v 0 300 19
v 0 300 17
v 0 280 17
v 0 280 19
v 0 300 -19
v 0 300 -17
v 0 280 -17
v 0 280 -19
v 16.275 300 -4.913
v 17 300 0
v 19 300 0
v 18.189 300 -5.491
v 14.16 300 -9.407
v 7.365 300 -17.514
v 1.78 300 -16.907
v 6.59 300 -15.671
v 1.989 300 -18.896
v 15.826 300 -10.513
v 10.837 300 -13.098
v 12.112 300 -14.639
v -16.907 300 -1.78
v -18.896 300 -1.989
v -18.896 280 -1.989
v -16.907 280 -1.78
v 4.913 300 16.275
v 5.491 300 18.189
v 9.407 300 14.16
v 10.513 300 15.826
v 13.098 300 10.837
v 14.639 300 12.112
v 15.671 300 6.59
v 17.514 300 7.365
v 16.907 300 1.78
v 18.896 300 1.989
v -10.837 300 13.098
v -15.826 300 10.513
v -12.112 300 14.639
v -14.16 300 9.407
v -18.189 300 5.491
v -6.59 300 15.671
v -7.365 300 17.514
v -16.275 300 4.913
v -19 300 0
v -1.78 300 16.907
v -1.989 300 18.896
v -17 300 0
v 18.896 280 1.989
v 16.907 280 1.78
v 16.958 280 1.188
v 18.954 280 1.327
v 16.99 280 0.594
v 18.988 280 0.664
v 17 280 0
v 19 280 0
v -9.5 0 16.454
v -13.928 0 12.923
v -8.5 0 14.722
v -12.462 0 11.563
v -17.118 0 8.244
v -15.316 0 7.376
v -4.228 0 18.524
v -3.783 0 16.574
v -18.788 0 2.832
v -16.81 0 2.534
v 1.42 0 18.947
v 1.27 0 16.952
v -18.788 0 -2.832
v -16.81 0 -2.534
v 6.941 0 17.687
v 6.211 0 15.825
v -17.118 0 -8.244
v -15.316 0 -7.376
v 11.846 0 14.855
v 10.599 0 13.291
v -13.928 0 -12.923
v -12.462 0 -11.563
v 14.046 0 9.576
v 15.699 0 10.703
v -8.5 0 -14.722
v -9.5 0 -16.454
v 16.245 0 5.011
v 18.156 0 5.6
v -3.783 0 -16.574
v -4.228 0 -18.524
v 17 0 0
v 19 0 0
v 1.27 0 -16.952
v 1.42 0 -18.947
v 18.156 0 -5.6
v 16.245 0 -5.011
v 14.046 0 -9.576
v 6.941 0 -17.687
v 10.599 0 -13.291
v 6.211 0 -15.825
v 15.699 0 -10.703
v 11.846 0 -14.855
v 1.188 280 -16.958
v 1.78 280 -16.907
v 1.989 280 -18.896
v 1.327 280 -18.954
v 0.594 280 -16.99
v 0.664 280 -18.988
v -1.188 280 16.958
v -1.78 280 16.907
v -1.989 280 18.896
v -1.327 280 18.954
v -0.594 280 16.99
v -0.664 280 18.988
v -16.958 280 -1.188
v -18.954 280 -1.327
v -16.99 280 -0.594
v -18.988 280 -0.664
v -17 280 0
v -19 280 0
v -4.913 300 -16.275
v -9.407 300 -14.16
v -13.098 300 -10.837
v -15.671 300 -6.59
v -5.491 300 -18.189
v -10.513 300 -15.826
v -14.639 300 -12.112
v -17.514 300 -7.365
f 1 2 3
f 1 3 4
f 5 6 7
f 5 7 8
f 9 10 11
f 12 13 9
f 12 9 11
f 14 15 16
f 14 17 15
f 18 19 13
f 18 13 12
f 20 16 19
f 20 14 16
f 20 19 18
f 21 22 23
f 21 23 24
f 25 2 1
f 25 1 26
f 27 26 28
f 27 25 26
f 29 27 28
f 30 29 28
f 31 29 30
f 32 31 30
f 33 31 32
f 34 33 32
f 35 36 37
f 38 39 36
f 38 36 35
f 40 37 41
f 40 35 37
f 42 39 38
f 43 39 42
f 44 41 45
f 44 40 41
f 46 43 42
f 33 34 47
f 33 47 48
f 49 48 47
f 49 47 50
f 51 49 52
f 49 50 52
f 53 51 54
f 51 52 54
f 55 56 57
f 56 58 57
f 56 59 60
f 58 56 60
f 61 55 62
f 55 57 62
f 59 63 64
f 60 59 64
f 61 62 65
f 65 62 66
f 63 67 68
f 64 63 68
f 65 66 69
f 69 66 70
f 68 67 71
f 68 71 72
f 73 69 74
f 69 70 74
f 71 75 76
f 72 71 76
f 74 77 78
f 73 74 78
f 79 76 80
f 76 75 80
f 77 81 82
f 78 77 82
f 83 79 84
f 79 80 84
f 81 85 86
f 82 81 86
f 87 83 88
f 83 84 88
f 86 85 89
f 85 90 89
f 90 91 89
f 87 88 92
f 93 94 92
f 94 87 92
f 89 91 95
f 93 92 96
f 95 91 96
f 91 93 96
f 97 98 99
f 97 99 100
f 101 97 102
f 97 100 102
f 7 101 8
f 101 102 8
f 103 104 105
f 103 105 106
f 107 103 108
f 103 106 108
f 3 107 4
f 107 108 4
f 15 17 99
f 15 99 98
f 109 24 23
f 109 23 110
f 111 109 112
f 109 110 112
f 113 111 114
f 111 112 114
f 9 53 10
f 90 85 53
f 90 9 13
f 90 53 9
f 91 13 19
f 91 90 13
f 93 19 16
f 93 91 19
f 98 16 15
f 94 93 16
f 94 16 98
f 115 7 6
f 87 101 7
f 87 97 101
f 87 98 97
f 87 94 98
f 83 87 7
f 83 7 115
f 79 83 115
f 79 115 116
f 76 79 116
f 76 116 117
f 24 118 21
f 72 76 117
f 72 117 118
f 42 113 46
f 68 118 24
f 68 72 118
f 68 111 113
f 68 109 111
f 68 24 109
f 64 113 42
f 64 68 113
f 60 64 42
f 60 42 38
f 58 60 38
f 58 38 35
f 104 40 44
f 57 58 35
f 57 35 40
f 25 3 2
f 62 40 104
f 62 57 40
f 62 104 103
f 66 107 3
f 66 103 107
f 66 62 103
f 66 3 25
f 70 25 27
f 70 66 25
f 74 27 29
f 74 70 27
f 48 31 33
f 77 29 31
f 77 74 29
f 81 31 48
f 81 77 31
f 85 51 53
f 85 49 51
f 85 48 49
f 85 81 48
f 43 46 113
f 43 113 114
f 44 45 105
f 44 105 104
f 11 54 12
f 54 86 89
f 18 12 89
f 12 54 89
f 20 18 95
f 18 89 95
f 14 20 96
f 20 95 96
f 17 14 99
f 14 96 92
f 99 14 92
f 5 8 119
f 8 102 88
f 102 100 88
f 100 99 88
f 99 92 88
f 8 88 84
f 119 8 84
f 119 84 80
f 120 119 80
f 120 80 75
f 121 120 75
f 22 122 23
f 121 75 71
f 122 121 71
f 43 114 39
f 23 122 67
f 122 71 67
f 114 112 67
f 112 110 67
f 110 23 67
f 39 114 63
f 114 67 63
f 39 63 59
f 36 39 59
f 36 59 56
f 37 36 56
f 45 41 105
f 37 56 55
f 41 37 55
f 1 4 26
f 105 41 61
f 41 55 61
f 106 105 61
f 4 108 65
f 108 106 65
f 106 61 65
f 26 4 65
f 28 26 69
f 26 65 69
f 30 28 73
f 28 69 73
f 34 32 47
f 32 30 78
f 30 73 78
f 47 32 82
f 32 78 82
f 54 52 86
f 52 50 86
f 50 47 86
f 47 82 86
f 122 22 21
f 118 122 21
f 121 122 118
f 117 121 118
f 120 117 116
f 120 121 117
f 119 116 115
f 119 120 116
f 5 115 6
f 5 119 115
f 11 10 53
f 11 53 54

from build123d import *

# Parameters (mm, degrees)
SKETCH_1_R               = 19
SKETCH_1_R_2             = 17
EXTRUDE_1_DEPTH          = 300
CUT_EXTRUDE_1_DEPTH      = 20
PATTERN_CIRCULAR_1_COUNT = 4


with BuildPart() as part:
    # 草图1 → 拉伸-薄壁1 (new body)
    with BuildSketch(Plane(origin=(0, 0, 0), x_dir=(1, 0, 0), z_dir=(0, 1, 0))):
        Circle(SKETCH_1_R)
        Circle(SKETCH_1_R_2, mode=Mode.SUBTRACT)
    extrude(amount=EXTRUDE_1_DEPTH)

    # 草图3 → 切除-拉伸1 (cut)
    with BuildSketch(Plane(origin=(0, 300, 0), x_dir=(1, 0, 0), z_dir=(0, 1, 0))):
        Polygon((0, 0), (0, 19), (2, 19), align=None)
    cut_extrude_1 = extrude(amount=-CUT_EXTRUDE_1_DEPTH, mode=Mode.SUBTRACT)

    # 阵列(圆周)1: 切除-拉伸1 ×4 about axis
    pattern_circular_1_axis = Axis((0, 300, 0), (0, -1, 0))
    for i in range(1, PATTERN_CIRCULAR_1_COUNT):
        add(cut_extrude_1.rotate(pattern_circular_1_axis, i * 360 / PATTERN_CIRCULAR_1_COUNT), mode=Mode.SUBTRACT)


solid = part.part
